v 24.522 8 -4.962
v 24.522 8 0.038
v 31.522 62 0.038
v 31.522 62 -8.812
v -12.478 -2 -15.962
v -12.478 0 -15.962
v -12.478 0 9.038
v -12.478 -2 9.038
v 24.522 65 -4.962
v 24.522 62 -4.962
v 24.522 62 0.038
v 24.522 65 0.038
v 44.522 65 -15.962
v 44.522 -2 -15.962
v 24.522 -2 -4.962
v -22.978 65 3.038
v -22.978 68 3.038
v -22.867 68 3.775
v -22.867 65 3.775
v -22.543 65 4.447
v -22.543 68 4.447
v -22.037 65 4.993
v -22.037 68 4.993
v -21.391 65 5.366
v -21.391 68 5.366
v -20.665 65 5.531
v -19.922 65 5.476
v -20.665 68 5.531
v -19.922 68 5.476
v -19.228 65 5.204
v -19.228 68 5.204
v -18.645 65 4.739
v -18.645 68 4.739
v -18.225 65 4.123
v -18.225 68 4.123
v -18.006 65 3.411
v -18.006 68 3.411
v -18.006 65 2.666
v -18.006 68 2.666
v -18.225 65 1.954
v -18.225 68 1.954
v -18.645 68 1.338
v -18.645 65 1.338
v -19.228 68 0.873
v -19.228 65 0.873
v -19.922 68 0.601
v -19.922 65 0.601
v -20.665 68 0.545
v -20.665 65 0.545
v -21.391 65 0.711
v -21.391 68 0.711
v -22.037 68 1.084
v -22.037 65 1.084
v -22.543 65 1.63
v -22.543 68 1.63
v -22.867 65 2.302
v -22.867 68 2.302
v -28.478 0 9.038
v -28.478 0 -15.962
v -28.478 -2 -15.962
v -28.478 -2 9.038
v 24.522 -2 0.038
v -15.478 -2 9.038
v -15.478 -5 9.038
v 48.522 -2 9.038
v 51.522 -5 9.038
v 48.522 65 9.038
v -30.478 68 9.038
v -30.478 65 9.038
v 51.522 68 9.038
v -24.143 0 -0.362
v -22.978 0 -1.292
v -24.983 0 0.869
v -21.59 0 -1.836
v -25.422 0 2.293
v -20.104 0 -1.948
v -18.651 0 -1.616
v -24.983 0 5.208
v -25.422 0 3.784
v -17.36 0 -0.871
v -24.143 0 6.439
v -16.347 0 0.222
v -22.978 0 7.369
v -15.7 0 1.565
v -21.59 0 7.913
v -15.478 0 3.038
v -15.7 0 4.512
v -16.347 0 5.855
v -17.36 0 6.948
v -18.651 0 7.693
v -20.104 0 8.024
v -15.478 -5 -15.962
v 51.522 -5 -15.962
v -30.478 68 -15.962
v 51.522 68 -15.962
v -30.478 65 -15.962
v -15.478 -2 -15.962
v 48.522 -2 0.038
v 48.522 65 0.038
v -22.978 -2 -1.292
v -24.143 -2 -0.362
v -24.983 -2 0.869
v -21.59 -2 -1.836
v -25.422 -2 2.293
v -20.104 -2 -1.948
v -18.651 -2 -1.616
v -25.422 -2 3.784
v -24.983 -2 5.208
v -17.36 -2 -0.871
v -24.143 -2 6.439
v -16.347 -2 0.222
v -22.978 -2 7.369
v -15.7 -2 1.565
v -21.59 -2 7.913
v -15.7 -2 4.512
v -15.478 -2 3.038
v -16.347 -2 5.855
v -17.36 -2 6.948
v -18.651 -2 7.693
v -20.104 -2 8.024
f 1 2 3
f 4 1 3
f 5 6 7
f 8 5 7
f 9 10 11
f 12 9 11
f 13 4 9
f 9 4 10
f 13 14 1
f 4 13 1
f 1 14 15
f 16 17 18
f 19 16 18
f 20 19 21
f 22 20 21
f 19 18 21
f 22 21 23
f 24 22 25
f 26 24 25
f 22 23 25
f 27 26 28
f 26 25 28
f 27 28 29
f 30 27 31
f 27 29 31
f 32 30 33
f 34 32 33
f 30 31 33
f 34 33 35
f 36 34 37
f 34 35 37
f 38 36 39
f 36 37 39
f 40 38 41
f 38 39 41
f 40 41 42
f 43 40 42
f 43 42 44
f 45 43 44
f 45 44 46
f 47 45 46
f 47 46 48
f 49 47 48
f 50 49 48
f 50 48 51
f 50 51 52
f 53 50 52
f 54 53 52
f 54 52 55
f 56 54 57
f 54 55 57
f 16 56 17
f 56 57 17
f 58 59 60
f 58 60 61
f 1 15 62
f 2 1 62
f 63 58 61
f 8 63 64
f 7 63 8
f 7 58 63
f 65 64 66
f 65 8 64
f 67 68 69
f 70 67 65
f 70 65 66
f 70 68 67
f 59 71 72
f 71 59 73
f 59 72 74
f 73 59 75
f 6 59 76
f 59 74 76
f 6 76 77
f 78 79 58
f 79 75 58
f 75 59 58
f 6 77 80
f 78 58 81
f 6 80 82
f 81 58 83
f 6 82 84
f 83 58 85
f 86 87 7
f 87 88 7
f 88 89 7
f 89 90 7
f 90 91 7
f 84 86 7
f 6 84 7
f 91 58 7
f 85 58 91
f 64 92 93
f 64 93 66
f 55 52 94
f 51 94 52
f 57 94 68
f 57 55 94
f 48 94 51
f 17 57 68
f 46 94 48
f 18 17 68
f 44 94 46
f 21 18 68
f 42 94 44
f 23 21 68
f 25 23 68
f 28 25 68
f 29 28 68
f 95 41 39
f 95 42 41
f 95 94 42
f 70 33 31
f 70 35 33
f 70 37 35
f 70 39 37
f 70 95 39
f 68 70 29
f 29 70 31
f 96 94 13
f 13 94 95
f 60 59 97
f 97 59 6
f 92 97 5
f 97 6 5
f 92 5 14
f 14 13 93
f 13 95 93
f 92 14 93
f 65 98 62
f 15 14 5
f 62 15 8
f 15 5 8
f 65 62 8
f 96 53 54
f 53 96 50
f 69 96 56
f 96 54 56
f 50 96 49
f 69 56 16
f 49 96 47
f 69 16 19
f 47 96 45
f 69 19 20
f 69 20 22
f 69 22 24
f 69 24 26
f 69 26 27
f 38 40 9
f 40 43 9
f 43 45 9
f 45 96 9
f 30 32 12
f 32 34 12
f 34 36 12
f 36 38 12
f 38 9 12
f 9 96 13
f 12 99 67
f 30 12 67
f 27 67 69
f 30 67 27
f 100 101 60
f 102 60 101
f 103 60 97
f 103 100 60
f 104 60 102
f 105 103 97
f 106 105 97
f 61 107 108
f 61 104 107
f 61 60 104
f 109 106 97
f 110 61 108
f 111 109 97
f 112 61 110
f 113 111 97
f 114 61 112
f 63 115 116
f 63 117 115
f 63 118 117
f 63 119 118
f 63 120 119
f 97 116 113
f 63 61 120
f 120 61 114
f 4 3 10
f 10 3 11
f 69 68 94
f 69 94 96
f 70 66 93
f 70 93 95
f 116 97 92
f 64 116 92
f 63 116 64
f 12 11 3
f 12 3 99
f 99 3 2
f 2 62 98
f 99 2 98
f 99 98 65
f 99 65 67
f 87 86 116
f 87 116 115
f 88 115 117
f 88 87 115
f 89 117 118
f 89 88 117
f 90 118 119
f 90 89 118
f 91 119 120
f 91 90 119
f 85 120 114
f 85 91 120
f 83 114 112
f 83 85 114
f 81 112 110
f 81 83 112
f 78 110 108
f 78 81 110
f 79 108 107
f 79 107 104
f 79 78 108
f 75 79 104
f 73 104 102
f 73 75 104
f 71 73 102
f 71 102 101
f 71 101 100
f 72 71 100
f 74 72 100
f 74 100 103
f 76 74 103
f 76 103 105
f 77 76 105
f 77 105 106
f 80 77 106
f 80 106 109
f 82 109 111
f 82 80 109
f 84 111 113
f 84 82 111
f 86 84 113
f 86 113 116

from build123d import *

# Parameters (mm, degrees)
F0_W      = 16
F0_H      = 25
F0_R      = 5
F1_DEPTH  = 2
F2_W      = 3
F2_H      = 25
F3_DEPTH  = 3
F4_W      = 3
F4_H      = 25
F5_DEPTH  = 65
F6_W      = 3
F6_H      = 25
F7_DEPTH  = 70
F10_DEPTH = 67
F11_W     = 3
F11_H     = 25
F12_DEPTH = 80
F13_R     = 2.5
F14_DEPTH = 3
F16_DEPTH = 16.001
F17_W     = 1
F17_H     = 67
F18_DEPTH = 9
F19_W     = 1
F19_H     = 73
F20_DEPTH = 25.001


with BuildPart() as f1:
    # F0 (on Front) → F1 (new body)
    with BuildSketch(Plane.XZ):
        with Locations((-20.477814, -3.461555)):
            Rectangle(F0_W, F0_H)
        with Locations((-20.477814, 3.038445)):
            Circle(F0_R, mode=Mode.SUBTRACT)
    extrude(amount=F1_DEPTH)

    # F2 (on face) → F3 (join)
    with BuildSketch(Plane.XZ.offset(2)):
        with Locations((-13.977814, -3.461555)):
            Rectangle(F2_W, F2_H)
    extrude(amount=F3_DEPTH)

    # F4 (on face) → F5 (join)
    with BuildSketch(Plane.YZ.offset(-12.477814)):
        with Locations((-3.5, -3.461555)):
            Rectangle(F4_W, F4_H)
    extrude(amount=F5_DEPTH)

    # F6 (on face) → F7 (join)
    with BuildSketch(Plane(origin=(0, -2, 0), x_dir=(-1, 0, 0), z_dir=(0, 1, 0))):
        with Locations((-51.022186, -3.461555)):
            Rectangle(F6_W, F6_H)
    extrude(amount=F7_DEPTH)

    # F9 (on face) → F10 (join)
    with BuildSketch(Plane(origin=(0, -2, 0), x_dir=(-1, 0, 0), z_dir=(0, 1, 0))):
        Polygon((-49.522186, 0.038445), (-49.522186, -15.961555), (-44.522186, -15.961555), (-24.522186, -4.961555), (-24.522186, 0.038445), align=None)
    extrude(amount=F10_DEPTH)

    # F11 (on face) → F12 (join)
    with BuildSketch(Plane(origin=(49.522186, 0, 0), x_dir=(0, -1, 0), z_dir=(-1, 0, 0))):
        with Locations((-66.5, -3.461555)):
            Rectangle(F11_W, F11_H)
    extrude(amount=F12_DEPTH)

    # F13 (on face) → F14 (cut)
    with BuildSketch(Plane(origin=(0, 68, 0), x_dir=(-1, 0, 0), z_dir=(0, 1, 0))):
        with Locations((20.477814, 3.038445)):
            Circle(F13_R)
    extrude(amount=-F14_DEPTH, mode=Mode.SUBTRACT)

    # F15 (on face) → F16 (cut, through all)
    with BuildSketch(Plane.XY.offset(0.038445)):
        Polygon((31.522186, 62), (24.522186, 62), (24.522186, 8), align=None)
    extrude(amount=-F16_DEPTH, mode=Mode.SUBTRACT)

    # F17 (on face) → F18 (join, through all)
    with BuildSketch(Plane.XY.offset(0.038445)):
        with Locations((49.022186, 31.5)):
            Rectangle(F17_W, F17_H)
    extrude(amount=F18_DEPTH)

    # F19 (on face) → F20 (cut, through all)
    with BuildSketch(Plane.XY.offset(9.038445)):
        with Locations((52.022186, 31.5)):
            Rectangle(F19_W, F19_H)
    extrude(amount=-F20_DEPTH, mode=Mode.SUBTRACT)


solid = f1.part
